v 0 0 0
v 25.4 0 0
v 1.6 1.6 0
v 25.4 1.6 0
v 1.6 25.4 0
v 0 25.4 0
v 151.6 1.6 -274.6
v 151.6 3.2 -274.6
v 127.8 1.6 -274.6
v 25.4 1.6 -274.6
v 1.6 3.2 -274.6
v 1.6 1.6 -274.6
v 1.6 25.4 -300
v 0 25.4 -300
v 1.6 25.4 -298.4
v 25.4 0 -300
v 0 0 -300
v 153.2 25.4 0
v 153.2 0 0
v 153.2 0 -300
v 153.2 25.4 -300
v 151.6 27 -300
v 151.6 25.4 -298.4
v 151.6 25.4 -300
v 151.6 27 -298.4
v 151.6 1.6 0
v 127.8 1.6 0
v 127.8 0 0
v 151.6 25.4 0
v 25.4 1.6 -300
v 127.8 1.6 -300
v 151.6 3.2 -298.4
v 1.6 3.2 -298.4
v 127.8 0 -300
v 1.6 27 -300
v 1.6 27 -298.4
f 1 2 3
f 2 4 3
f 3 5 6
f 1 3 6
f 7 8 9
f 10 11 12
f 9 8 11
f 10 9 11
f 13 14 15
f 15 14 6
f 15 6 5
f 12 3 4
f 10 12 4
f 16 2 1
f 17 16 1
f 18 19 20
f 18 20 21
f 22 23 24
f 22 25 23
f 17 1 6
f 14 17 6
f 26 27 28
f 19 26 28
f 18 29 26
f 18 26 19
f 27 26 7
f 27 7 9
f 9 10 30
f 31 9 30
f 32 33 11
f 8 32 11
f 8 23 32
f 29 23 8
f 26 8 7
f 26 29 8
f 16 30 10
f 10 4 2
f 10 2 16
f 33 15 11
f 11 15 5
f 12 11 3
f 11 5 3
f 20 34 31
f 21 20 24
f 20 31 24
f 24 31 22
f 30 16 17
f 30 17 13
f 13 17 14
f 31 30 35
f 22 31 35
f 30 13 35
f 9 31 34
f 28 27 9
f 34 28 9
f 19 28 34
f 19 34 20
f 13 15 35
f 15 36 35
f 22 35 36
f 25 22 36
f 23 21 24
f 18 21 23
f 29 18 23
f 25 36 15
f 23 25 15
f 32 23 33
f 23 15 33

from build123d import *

# Parameters (mm, degrees)
BOSS_EXTRUDE1_DEPTH   = 300
BOSS_EXTRUDE1_2_DEPTH = 300
BOSS_EXTRUDE2_DEPTH   = 150


with BuildPart() as part:
    # Sketch1 → Boss-Extrude1 (new body)
    with BuildSketch(Plane.XY):
        Polygon((25.4, 0), (0, 0), (0, 25.4), (1.6002, 25.4), (1.6002, 1.6002), (25.4, 1.6002), align=None)
    extrude(amount=-BOSS_EXTRUDE1_DEPTH)



with BuildPart() as body_2:
    # Sketch1 → Boss-Extrude1 2 (new body)
    with BuildSketch(Plane.XY):
        Polygon((153.2004, 25.4), (151.6002, 25.4), (151.6002, 1.6002), (127.8004, 1.6002), (127.8004, 0), (153.2004, 0), align=None)
    extrude(amount=-BOSS_EXTRUDE1_2_DEPTH)


with BuildPart() as part_1:
    add(part.part)

    add(body_2.part)  # Boss-Extrude2 merges body 2
    # Sketch2 → Boss-Extrude2 (add)
    with BuildSketch(Plane(origin=(1.6002, 0, 0), x_dir=(0, 0, -1), z_dir=(1, 0, 0))):
        Polygon((274.6, 1.6002), (300, 1.6002), (300, 27.0002), (298.3998, 27.0002), (298.3998, 3.2004), (274.6, 3.2004), align=None)
    extrude(amount=BOSS_EXTRUDE2_DEPTH)


solid = part_1.part
